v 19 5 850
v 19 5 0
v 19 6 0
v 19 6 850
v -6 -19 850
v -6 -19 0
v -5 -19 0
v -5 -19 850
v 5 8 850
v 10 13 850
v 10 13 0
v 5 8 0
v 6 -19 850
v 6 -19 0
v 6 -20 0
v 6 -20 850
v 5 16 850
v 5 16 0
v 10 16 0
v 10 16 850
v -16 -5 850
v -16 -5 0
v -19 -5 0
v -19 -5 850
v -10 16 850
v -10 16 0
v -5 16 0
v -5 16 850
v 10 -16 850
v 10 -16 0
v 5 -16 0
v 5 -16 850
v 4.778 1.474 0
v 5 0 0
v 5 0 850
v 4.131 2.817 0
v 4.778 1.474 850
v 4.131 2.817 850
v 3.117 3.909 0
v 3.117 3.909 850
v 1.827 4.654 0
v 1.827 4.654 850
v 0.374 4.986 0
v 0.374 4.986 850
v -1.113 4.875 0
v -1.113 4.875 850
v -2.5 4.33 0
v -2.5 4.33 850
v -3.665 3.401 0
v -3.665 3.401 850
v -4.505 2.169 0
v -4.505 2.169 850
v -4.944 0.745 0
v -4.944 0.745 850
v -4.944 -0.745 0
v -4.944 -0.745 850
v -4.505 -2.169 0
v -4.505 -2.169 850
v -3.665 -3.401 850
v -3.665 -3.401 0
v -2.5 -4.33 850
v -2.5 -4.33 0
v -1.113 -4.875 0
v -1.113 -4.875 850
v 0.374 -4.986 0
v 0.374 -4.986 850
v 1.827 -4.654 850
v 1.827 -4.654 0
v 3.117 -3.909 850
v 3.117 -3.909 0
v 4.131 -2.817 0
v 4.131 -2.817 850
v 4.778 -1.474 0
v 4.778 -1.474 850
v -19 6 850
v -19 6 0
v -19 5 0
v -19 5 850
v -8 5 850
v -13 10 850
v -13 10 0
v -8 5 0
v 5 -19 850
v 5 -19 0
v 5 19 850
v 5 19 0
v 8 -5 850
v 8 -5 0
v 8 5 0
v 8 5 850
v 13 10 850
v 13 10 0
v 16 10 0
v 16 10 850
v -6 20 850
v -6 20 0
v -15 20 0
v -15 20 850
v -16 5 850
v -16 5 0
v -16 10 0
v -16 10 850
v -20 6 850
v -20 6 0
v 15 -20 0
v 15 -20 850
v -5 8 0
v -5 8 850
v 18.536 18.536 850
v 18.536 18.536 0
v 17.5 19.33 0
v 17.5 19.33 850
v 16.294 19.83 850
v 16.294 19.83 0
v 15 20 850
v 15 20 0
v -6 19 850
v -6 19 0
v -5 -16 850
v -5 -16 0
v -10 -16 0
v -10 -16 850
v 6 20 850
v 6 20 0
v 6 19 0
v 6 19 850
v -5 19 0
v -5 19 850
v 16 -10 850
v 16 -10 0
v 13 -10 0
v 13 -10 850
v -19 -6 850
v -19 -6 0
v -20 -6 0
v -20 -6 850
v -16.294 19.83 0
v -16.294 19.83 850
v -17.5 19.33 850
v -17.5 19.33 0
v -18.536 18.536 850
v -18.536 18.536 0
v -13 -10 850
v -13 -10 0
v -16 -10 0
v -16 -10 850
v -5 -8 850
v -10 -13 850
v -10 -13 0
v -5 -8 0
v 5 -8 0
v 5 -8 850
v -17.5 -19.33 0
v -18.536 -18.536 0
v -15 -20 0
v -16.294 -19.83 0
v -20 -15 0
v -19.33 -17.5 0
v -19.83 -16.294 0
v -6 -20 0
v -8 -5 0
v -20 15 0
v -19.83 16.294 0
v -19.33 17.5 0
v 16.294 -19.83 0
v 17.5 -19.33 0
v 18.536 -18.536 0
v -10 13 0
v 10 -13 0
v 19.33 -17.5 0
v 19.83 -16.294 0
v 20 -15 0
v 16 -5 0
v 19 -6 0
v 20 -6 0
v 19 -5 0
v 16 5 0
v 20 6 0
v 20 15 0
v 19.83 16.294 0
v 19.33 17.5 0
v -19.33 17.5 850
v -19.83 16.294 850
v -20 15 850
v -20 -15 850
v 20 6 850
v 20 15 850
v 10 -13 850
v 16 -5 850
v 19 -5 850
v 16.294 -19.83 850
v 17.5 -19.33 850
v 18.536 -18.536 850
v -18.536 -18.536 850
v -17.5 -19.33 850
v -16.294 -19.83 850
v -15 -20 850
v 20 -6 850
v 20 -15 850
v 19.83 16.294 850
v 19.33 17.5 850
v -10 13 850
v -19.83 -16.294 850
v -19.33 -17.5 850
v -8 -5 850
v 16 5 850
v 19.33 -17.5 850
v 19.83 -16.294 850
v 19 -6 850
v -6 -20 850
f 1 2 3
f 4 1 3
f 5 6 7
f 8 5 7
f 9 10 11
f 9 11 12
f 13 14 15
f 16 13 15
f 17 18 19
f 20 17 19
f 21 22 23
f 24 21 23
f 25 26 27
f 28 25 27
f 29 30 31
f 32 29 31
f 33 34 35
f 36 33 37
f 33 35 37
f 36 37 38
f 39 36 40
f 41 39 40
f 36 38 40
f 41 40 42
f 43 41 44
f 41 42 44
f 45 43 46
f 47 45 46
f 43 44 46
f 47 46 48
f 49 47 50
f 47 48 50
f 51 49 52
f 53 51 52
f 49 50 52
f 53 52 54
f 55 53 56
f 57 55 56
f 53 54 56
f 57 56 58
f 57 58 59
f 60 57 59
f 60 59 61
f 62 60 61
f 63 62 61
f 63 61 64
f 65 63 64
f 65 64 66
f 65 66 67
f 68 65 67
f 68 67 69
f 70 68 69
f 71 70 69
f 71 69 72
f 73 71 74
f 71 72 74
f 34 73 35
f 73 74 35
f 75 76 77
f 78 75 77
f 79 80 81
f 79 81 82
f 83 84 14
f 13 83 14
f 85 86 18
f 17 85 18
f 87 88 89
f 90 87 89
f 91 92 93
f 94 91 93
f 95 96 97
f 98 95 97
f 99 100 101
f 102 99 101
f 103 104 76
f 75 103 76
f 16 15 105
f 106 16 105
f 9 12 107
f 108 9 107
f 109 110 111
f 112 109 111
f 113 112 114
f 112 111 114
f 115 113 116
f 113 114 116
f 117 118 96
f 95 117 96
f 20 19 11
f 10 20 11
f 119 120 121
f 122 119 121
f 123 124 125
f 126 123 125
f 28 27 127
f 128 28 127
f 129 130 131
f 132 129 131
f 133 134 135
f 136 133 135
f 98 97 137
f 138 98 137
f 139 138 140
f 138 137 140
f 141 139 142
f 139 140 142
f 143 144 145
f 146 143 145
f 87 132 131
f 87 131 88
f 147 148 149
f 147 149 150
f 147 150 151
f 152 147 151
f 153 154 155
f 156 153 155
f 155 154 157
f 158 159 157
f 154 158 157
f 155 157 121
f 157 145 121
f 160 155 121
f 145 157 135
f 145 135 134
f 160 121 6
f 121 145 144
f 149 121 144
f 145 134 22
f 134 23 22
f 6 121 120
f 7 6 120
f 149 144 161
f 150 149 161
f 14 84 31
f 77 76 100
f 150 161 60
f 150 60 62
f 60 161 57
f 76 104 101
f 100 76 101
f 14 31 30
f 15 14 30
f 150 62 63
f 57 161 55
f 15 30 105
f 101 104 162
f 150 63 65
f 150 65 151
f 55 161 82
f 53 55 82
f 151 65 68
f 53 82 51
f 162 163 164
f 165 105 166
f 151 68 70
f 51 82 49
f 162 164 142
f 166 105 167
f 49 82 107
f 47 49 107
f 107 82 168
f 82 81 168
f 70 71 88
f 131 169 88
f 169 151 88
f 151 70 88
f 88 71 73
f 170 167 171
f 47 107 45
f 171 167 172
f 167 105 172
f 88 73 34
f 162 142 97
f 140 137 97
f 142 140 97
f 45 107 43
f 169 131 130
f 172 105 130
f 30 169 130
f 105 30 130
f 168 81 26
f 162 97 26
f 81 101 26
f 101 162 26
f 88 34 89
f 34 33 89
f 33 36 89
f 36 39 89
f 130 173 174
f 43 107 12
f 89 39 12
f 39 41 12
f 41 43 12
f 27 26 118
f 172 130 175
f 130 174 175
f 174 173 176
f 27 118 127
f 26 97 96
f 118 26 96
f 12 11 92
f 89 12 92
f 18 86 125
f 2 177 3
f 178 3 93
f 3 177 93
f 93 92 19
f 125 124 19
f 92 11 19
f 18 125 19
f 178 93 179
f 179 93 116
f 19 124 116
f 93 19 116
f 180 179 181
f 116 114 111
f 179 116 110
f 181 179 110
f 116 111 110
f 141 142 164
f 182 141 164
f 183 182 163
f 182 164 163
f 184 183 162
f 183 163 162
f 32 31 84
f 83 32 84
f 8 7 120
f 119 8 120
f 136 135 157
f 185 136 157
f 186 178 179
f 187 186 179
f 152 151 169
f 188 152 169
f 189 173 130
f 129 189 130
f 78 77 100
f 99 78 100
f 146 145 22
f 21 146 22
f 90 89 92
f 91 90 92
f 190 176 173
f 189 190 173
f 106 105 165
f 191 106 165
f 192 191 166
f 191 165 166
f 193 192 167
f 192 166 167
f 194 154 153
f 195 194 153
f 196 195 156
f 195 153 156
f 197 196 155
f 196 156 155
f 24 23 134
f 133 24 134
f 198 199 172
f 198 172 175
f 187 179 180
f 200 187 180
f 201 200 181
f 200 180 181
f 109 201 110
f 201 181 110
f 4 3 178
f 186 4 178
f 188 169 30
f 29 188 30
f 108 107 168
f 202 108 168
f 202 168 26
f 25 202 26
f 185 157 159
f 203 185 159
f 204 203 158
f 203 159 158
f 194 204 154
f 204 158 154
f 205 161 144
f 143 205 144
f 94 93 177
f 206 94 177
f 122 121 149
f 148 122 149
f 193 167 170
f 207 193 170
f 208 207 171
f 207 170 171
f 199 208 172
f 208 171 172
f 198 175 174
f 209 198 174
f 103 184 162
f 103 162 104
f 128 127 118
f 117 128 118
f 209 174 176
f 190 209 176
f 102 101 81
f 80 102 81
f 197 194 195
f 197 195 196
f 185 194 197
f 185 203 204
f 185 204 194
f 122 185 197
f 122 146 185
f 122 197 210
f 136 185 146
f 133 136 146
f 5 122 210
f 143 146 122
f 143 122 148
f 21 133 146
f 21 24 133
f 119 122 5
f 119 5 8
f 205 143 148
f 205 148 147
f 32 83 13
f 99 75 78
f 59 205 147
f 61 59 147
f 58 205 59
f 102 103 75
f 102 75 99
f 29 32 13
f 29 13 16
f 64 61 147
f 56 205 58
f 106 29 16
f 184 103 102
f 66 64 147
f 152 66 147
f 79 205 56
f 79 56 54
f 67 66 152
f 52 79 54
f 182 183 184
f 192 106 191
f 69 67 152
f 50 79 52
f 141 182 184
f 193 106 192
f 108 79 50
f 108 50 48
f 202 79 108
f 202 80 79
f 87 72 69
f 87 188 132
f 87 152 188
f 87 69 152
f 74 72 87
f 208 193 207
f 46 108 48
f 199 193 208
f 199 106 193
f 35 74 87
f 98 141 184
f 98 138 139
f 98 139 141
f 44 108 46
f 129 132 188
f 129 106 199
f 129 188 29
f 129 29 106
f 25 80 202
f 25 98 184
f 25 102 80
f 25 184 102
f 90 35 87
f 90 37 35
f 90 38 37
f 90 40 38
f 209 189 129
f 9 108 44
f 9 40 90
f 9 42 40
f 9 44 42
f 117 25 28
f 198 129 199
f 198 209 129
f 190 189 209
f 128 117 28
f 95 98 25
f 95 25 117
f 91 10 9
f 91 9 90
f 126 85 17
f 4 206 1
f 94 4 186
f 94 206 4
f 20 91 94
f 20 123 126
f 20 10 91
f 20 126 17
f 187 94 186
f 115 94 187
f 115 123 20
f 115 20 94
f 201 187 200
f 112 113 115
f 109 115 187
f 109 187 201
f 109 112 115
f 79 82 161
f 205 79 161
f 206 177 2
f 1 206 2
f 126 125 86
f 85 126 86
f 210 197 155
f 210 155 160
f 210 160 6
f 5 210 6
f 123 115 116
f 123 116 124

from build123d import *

# Parameters (mm, degrees)
F1_DEPTH = 850
F2_R     = 5
F3_DEPTH = 850


with BuildPart() as f1:
    # F0 (on Top) → F1 (new body)
    with BuildSketch(Plane.XY):
        with BuildLine():
            Line((8, -5), (8, 0))
            Line((8, 0), (8, 5))
            Line((8, 5), (13, 10))
            Line((13, 10), (16, 10))
            Line((16, 10), (16, 5))
            Line((16, 5), (19, 5))
            Line((19, 5), (19, 6))
            Line((19, 6), (20, 6))
            Line((20, 6), (20, 15))
            ThreePointArc((20, 15), (19.619398, 16.913417), (18.535534, 18.535534))
            ThreePointArc((18.535534, 18.535534), (16.913417, 19.619398), (15, 20))
            Line((15, 20), (6, 20))
            Line((6, 20), (6, 19))
            Line((6, 19), (5, 19))
            Line((5, 19), (5, 16))
            Line((5, 16), (10, 16))
            Line((10, 16), (10, 13))
            Line((10, 13), (5, 8))
            Line((5, 8), (0, 8))
            Line((0, 8), (-5, 8))
            Line((-5, 8), (-10, 13))
            Line((-10, 13), (-10, 16))
            Line((-10, 16), (-5, 16))
            Line((-5, 16), (-5, 19))
            Line((-5, 19), (-6, 19))
            Line((-6, 19), (-6, 20))
            Line((-6, 20), (-15, 20))
            ThreePointArc((-15, 20), (-16.913417, 19.619398), (-18.535534, 18.535534))
            ThreePointArc((-18.535534, 18.535534), (-19.619398, 16.913417), (-20, 15))
            Line((-20, 15), (-20, 6))
            Line((-20, 6), (-19, 6))
            Line((-19, 6), (-19, 5))
            Line((-19, 5), (-16, 5))
            Line((-16, 5), (-16, 10))
            Line((-16, 10), (-13, 10))
            Line((-13, 10), (-8, 5))
            Line((-8, 5), (-8, 0))
            Line((-8, 0), (-8, -5))
            Line((-8, -5), (-13, -10))
            Line((-13, -10), (-16, -10))
            Line((-16, -10), (-16, -5))
            Line((-16, -5), (-19, -5))
            Line((-19, -5), (-19, -6))
            Line((-19, -6), (-20, -6))
            Line((-20, -6), (-20, -15))
            ThreePointArc((-20, -15), (-19.619398, -16.913417), (-18.535534, -18.535534))
            ThreePointArc((-18.535534, -18.535534), (-16.913417, -19.619398), (-15, -20))
            Line((-15, -20), (-6, -20))
            Line((-6, -20), (-6, -19))
            Line((-6, -19), (-5, -19))
            Line((-5, -19), (-5, -16))
            Line((-5, -16), (-10, -16))
            Line((-10, -16), (-10, -13))
            Line((-10, -13), (-5, -8))
            Line((-5, -8), (0, -8))
            Line((0, -8), (5, -8))
            Line((5, -8), (10, -13))
            Line((10, -13), (10, -16))
            Line((10, -16), (5, -16))
            Line((5, -16), (5, -19))
            Line((5, -19), (6, -19))
            Line((6, -19), (6, -20))
            Line((6, -20), (15, -20))
            ThreePointArc((15, -20), (16.913417, -19.619398), (18.535534, -18.535534))
            ThreePointArc((18.535534, -18.535534), (19.619398, -16.913417), (20, -15))
            Line((20, -15), (20, -6))
            Line((20, -6), (19, -6))
            Line((19, -6), (19, -5))
            Line((19, -5), (16, -5))
            Line((16, -5), (16, -10))
            Line((16, -10), (13, -10))
            Line((13, -10), (8, -5))
        make_face()
    extrude(amount=F1_DEPTH)

    # F2 (on face) → F3 (cut, through all)
    with BuildSketch(Plane.XY.offset(850)):
        Circle(F2_R)
    extrude(amount=-F3_DEPTH, mode=Mode.SUBTRACT)


solid = f1.part
